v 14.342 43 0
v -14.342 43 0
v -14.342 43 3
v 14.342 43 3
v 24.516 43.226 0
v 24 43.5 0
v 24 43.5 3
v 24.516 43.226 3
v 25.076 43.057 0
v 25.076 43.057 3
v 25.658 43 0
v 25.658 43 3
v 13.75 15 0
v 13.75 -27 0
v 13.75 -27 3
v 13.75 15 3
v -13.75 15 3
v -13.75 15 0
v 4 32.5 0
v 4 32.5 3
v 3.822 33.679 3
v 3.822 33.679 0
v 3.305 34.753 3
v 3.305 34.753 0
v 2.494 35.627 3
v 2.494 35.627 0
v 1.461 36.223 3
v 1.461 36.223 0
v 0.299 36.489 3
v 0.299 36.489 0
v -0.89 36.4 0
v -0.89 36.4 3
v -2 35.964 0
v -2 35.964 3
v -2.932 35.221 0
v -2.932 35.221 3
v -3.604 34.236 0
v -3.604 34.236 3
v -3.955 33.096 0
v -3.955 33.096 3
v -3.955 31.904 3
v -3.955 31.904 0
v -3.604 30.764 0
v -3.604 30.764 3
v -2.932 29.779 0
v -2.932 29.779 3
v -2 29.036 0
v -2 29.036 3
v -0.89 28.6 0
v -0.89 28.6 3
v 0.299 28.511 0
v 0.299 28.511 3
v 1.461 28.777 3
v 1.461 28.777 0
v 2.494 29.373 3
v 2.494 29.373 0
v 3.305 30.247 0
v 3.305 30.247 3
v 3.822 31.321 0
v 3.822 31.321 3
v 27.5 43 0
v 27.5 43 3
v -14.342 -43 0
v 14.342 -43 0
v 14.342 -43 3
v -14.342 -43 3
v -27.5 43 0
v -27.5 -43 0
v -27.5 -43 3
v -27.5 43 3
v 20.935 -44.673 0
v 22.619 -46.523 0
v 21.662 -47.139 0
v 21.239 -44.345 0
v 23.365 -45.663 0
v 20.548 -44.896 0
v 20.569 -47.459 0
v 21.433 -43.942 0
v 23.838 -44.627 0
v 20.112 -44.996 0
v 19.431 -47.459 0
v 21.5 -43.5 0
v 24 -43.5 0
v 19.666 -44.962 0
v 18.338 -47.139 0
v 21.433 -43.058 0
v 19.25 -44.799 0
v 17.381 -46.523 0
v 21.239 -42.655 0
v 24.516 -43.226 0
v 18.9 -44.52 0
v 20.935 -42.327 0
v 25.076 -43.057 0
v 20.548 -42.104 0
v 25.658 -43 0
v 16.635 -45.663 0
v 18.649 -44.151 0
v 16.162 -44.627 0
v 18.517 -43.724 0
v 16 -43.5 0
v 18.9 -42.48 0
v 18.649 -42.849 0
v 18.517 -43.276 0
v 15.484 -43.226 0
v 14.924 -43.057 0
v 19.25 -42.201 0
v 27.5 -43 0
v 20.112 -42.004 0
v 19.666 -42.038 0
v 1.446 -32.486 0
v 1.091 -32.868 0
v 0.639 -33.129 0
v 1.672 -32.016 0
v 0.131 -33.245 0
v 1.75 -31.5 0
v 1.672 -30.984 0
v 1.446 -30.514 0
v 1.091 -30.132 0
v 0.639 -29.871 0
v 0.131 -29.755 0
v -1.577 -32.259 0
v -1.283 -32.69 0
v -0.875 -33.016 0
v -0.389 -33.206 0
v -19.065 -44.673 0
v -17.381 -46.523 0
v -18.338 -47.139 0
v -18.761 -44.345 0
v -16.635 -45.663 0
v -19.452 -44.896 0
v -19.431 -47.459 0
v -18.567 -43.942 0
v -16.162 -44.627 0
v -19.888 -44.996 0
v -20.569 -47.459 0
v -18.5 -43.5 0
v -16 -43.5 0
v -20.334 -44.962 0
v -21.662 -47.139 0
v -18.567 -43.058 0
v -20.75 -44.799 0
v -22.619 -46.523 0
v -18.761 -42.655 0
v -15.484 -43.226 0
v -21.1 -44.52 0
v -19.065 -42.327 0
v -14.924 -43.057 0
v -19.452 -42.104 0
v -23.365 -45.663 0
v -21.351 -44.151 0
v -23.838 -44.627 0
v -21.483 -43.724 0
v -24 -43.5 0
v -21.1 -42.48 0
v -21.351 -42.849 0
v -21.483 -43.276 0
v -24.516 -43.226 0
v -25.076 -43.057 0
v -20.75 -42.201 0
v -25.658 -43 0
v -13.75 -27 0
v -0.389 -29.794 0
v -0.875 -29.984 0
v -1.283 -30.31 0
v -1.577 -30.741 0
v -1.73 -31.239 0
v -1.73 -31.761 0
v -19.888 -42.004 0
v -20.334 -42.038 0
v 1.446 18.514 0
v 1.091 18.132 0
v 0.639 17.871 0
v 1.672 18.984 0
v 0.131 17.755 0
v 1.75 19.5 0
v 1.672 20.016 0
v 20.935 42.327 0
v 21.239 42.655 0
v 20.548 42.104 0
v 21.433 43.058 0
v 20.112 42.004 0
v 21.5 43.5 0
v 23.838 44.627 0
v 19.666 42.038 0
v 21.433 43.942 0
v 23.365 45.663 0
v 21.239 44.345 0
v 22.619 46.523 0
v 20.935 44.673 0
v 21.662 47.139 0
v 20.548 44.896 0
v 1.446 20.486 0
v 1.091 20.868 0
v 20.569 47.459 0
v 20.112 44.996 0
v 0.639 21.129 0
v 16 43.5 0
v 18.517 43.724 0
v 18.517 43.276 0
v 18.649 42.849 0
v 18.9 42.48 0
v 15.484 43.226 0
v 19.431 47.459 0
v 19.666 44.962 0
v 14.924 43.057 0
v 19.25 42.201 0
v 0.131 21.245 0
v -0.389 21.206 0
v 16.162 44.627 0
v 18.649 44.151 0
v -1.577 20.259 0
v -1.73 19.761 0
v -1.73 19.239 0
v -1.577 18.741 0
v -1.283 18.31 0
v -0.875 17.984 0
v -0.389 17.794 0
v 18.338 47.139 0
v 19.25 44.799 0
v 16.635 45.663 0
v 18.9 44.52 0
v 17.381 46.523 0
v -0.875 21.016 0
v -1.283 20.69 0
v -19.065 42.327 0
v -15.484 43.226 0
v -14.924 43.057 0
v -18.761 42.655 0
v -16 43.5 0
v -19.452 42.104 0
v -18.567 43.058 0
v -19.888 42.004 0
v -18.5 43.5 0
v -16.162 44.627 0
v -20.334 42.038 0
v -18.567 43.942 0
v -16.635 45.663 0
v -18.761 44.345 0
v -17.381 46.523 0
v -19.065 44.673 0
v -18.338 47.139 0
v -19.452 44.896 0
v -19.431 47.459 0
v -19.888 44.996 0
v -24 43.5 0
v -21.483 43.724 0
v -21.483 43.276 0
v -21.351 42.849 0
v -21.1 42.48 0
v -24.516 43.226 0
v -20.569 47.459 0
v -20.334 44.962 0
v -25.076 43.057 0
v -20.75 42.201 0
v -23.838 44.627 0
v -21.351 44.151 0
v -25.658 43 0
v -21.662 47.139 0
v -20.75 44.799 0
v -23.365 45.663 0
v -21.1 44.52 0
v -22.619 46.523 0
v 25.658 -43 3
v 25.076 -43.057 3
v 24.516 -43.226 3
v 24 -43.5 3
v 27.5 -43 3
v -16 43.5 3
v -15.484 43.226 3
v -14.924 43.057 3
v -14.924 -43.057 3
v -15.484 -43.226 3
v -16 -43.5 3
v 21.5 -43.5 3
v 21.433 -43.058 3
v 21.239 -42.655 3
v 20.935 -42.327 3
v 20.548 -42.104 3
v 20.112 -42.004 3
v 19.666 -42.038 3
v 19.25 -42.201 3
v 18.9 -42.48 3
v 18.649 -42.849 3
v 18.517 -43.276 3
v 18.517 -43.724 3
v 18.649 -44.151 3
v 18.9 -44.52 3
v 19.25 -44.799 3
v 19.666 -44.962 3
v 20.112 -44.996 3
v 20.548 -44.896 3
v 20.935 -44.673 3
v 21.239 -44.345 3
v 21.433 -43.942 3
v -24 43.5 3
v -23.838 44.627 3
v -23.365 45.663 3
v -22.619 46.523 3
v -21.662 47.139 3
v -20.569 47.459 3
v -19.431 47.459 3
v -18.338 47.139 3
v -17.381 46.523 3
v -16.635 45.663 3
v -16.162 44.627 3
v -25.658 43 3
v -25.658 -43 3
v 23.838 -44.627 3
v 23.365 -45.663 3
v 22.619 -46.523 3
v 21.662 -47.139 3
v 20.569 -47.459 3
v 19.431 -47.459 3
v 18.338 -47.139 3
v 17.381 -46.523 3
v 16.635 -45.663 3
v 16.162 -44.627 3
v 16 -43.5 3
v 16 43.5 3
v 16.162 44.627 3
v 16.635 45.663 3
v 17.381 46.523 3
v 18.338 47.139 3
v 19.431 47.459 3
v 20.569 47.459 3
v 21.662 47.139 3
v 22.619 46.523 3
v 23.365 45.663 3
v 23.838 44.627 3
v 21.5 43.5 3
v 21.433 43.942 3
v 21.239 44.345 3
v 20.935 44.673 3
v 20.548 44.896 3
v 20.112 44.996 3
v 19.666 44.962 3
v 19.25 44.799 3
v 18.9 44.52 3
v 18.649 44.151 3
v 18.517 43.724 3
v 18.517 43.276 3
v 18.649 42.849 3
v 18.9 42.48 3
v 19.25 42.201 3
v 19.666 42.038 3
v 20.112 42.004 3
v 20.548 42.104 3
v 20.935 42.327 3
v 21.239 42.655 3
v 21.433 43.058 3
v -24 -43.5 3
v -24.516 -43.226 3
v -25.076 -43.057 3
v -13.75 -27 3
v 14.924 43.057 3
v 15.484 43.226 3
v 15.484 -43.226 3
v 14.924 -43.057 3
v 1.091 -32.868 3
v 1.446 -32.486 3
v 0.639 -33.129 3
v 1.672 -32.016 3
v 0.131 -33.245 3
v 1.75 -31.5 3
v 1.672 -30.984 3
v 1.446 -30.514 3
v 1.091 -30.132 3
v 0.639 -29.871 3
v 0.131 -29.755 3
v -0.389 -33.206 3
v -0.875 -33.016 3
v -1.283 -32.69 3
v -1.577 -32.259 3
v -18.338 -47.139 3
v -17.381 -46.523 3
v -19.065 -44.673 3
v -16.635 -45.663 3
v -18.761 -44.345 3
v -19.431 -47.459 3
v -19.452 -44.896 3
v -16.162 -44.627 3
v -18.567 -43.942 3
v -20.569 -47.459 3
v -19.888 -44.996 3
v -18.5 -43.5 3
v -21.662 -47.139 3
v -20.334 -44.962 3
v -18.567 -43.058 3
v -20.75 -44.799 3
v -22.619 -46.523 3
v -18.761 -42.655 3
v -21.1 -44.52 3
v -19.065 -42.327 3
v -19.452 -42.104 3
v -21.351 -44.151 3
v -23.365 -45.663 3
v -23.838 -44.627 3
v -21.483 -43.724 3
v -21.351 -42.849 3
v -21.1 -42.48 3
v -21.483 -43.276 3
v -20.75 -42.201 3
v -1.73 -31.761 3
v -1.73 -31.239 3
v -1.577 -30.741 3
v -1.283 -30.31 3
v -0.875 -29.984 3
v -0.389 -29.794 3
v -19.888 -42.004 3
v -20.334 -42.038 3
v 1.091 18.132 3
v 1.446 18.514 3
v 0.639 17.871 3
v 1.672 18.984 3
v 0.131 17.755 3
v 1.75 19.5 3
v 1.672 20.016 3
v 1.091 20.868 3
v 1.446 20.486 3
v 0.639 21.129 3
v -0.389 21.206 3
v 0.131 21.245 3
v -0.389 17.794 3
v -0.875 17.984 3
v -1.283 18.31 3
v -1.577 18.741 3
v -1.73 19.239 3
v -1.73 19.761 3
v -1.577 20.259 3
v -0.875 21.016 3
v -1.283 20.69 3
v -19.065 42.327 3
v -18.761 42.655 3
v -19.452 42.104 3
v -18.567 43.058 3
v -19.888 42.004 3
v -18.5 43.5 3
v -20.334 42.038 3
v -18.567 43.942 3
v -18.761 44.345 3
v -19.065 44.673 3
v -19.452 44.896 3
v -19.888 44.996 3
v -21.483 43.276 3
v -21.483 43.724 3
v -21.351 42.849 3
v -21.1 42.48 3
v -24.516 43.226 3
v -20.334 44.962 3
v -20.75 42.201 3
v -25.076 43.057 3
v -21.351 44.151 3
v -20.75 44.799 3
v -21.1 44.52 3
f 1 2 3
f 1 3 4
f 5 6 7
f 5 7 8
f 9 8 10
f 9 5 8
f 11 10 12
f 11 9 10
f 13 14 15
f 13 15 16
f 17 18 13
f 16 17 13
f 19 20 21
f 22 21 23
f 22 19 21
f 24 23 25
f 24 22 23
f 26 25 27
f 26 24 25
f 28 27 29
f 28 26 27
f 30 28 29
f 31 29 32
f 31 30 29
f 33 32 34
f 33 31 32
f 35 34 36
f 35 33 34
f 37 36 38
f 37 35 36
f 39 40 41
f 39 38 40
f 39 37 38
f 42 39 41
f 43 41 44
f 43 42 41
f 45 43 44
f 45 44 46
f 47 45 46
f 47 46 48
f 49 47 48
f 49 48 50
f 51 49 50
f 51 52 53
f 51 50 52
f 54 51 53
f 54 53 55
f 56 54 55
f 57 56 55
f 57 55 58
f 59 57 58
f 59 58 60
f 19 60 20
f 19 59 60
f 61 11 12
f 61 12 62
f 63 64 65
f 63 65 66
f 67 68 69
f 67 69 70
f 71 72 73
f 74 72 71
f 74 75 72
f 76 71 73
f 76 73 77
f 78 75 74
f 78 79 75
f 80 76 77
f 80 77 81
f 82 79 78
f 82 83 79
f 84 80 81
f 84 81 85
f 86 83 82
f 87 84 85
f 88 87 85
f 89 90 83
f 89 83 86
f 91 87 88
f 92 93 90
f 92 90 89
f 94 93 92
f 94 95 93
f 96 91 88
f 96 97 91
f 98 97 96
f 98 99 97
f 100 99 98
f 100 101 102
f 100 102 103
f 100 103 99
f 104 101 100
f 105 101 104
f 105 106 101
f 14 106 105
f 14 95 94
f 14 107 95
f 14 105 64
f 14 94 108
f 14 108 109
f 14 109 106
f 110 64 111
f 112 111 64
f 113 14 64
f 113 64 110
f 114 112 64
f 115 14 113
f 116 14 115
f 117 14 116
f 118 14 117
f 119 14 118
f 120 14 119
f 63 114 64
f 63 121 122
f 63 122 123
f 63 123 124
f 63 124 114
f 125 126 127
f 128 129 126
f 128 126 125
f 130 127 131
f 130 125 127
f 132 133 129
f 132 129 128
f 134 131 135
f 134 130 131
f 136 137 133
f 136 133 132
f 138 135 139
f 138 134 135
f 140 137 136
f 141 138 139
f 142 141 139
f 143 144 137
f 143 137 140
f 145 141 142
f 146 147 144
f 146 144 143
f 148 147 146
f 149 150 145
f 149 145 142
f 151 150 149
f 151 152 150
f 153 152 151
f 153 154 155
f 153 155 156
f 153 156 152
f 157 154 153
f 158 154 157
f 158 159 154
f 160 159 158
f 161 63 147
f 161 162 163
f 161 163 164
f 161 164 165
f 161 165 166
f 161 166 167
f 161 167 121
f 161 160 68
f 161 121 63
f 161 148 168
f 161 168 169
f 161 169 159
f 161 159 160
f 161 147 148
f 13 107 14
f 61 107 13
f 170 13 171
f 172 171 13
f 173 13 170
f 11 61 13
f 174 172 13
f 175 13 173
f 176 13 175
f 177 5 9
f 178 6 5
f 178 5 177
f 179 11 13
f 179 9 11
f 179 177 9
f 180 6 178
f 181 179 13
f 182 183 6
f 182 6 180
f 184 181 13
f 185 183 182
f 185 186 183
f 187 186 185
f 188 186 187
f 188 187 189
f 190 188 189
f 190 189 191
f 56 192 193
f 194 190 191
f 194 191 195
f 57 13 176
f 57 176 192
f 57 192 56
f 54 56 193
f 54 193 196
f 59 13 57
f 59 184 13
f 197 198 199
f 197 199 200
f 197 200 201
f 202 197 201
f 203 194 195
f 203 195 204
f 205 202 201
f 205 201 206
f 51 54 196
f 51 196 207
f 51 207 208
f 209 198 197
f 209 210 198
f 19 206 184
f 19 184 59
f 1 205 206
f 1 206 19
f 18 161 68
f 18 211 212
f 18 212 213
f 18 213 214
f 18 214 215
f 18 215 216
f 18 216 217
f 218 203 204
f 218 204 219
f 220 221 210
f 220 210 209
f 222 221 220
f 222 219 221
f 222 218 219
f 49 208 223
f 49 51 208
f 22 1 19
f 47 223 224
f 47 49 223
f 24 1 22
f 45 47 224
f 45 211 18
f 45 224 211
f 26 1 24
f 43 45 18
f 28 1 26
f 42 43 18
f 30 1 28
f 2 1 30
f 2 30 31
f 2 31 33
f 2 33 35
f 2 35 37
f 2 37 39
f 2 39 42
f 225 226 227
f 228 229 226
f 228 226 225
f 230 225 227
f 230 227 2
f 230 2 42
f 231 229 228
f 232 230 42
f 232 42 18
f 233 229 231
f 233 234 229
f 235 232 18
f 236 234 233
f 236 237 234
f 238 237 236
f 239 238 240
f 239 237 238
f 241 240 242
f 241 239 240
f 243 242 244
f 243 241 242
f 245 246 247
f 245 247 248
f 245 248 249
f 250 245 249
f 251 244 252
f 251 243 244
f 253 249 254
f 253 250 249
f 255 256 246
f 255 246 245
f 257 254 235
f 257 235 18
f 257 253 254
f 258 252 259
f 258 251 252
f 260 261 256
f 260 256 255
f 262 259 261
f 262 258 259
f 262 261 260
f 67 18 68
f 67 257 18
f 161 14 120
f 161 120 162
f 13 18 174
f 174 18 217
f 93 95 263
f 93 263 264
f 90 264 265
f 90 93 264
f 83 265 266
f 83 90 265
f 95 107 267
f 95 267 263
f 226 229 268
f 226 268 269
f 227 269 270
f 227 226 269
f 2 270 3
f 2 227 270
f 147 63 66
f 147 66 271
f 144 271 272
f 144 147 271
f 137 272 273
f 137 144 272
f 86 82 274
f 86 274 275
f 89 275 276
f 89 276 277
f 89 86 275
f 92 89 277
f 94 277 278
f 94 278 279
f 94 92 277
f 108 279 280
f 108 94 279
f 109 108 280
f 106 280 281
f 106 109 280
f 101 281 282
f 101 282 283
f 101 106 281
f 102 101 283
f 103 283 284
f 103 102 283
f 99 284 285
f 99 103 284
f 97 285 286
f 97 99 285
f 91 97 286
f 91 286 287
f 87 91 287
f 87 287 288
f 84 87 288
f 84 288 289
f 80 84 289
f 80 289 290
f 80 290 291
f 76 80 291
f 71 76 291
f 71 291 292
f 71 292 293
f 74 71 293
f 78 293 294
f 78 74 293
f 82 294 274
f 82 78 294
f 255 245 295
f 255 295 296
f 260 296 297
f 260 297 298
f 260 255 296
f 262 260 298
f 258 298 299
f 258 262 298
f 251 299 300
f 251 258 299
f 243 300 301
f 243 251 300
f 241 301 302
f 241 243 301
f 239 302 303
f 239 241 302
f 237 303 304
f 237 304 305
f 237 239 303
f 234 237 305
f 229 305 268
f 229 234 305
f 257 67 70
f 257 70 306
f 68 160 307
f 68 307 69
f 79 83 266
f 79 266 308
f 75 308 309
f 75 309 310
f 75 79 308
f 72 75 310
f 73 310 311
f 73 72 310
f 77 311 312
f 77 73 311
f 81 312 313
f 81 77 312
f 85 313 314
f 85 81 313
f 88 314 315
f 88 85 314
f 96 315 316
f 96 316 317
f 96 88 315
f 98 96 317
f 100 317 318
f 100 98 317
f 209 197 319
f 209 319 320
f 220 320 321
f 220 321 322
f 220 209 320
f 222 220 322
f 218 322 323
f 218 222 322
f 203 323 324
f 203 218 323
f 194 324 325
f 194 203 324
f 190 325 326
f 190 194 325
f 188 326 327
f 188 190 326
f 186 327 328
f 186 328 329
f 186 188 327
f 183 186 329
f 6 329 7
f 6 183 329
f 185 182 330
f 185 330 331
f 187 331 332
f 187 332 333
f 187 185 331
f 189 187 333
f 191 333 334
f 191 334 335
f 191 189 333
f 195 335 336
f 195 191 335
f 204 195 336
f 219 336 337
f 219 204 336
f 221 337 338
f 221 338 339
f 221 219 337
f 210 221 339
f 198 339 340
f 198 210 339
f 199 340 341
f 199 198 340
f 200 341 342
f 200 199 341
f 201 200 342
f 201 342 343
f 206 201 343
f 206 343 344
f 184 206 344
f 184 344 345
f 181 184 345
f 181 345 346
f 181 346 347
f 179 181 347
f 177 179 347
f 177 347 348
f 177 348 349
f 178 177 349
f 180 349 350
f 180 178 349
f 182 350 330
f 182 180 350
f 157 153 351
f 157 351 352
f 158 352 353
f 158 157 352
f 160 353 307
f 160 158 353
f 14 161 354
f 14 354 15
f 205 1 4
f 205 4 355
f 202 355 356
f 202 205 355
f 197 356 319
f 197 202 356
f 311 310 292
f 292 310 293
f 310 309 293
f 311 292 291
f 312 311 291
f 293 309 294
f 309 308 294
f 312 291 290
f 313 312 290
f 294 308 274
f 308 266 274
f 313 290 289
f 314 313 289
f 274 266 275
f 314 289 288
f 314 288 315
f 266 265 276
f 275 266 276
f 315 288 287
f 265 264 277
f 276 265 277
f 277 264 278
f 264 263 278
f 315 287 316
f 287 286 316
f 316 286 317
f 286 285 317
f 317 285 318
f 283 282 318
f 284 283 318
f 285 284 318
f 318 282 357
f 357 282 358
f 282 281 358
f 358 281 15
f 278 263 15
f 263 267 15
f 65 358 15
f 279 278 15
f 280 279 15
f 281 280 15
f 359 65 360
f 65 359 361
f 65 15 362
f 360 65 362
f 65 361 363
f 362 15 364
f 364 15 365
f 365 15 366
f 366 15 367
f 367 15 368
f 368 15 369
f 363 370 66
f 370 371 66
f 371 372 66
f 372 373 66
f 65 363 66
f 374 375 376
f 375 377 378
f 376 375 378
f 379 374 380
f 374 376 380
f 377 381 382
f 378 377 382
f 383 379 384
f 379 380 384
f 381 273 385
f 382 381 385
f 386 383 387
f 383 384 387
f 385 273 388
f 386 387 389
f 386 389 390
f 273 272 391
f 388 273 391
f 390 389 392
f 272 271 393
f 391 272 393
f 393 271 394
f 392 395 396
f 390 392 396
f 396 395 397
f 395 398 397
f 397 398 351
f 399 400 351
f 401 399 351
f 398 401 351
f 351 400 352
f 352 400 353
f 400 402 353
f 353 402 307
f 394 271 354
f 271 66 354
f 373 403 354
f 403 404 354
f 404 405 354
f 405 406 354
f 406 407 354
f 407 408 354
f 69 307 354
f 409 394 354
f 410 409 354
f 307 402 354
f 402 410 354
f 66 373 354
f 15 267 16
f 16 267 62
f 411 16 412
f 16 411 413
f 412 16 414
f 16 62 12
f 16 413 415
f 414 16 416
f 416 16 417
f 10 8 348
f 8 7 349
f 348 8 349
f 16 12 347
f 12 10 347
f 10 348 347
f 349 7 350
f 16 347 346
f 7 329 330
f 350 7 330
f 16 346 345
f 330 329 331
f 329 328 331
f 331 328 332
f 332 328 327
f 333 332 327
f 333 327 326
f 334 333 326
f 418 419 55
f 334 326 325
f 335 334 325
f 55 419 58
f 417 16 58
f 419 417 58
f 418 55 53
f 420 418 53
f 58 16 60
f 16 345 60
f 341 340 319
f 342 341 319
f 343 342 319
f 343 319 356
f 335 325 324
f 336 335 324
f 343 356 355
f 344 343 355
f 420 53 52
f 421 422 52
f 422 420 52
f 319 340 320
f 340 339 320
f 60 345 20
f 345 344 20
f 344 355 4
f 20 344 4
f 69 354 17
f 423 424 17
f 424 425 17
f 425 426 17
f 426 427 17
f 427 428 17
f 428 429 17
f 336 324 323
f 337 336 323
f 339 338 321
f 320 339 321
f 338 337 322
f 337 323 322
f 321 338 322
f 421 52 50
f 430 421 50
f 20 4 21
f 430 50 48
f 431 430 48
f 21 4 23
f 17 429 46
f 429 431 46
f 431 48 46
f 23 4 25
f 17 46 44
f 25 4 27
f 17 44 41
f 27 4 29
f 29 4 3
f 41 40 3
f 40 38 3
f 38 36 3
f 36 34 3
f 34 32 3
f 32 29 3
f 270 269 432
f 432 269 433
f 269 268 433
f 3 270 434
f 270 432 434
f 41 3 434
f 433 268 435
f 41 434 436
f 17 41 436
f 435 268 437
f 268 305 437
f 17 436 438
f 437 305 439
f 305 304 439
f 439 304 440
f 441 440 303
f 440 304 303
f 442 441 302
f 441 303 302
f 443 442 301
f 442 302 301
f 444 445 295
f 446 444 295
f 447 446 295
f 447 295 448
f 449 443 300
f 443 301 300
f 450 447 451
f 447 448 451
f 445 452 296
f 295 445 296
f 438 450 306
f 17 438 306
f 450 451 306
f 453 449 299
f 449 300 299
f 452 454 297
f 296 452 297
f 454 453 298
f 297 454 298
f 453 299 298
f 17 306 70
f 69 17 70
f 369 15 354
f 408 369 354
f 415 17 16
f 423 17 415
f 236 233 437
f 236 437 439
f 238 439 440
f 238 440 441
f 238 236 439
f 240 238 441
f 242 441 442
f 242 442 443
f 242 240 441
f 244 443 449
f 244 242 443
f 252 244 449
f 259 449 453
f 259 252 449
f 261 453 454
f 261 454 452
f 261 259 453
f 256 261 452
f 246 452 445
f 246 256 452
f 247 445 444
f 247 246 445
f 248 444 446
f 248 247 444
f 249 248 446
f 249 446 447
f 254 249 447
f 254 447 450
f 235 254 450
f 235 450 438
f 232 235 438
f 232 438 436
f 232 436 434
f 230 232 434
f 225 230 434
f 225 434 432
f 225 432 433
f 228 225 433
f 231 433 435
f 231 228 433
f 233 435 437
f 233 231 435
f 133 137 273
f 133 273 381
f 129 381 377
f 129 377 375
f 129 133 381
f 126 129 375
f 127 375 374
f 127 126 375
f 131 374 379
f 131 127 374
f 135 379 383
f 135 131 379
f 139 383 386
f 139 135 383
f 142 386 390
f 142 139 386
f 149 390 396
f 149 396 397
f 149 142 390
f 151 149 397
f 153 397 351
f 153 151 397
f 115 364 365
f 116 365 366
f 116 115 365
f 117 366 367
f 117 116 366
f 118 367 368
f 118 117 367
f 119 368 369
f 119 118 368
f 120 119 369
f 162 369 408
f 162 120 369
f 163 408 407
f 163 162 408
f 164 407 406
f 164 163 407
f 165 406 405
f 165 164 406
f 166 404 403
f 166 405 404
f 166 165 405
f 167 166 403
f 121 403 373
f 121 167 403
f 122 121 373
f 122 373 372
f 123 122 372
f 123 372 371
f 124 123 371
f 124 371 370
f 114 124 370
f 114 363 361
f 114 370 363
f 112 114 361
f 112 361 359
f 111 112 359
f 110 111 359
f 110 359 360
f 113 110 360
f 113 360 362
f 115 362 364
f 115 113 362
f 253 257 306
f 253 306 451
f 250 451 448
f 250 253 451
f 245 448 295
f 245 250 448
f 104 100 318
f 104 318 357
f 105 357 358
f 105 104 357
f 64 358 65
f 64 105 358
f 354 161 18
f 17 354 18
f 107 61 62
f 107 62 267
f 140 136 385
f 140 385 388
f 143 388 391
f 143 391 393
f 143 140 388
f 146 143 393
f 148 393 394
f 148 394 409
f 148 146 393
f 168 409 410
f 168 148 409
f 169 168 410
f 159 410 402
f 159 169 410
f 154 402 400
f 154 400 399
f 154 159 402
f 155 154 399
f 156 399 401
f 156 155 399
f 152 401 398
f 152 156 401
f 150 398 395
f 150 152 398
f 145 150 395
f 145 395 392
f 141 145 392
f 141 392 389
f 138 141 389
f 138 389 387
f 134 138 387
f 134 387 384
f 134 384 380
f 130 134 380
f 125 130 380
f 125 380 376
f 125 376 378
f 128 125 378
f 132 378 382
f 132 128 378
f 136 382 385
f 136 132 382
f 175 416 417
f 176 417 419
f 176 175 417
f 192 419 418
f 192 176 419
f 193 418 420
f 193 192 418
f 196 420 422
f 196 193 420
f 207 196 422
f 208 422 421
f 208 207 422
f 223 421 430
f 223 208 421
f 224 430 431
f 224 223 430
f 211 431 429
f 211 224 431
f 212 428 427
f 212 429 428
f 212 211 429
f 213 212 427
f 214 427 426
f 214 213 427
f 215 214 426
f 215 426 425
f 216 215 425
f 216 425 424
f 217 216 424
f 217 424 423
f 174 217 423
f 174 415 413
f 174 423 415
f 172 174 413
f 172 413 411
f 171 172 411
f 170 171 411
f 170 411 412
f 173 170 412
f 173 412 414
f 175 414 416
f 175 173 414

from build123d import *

# Parameters (mm, degrees)
SKETCH1_R           = 1.5
BOSS_EXTRUDE1_DEPTH = 3
SKETCH2_R           = 4
SKETCH2_R_2         = 1.75
SKETCH2_W           = 27.5
SKETCH2_H           = 42
CUT_EXTRUDE1_DEPTH  = 55.968172609


with BuildPart() as part:
    # Sketch1 → Boss-Extrude1 (new body)
    with BuildSketch(Plane.XY):
        with BuildLine():
            ThreePointArc((-14.341687605, -43), (-15.207713009, -43.127718677), (-16, -43.5))
            ThreePointArc((-16, -43.5), (-20, -47.5), (-24, -43.5))
            ThreePointArc((-24, -43.5), (-24.792286991, -43.127718677), (-25.658312395, -43))
            Line((-25.658312395, -43), (-27.5, -43))
            Line((-27.5, -43), (-27.5, 43))
            Line((-27.5, 43), (-25.658312395, 43))
            ThreePointArc((-25.658312395, 43), (-24.792286991, 43.127718677), (-24, 43.5))
            ThreePointArc((-24, 43.5), (-20, 47.5), (-16, 43.5))
            ThreePointArc((-16, 43.5), (-15.207713009, 43.127718677), (-14.341687605, 43))
            Line((-14.341687605, 43), (-10.658312395, 43))
            Line((-10.658312395, 43), (10.658312395, 43))
            Line((10.658312395, 43), (14.341687605, 43))
            ThreePointArc((14.341687605, 43), (15.207713009, 43.127718677), (16, 43.5))
            ThreePointArc((16, 43.5), (20, 47.5), (24, 43.5))
            ThreePointArc((24, 43.5), (24.792286991, 43.127718677), (25.658312395, 43))
            Line((25.658312395, 43), (27.5, 43))
            Line((27.5, 43), (27.5, -43))
            Line((27.5, -43), (25.658312395, -43))
            ThreePointArc((25.658312395, -43), (24.792286991, -43.127718677), (24, -43.5))
            ThreePointArc((24, -43.5), (20, -47.5), (16, -43.5))
            ThreePointArc((16, -43.5), (15.207713009, -43.127718677), (14.341687605, -43))
            Line((14.341687605, -43), (10.658312395, -43))
            Line((10.658312395, -43), (-10.658312395, -43))
            Line((-10.658312395, -43), (-14.341687605, -43))
        make_face()
        with Locations((20, -43.5)):
            Circle(SKETCH1_R, mode=Mode.SUBTRACT)
        with Locations((-20, -43.5)):
            Circle(SKETCH1_R, mode=Mode.SUBTRACT)
        with Locations((20, 43.5)):
            Circle(SKETCH1_R, mode=Mode.SUBTRACT)
        with Locations((-20, 43.5)):
            Circle(SKETCH1_R, mode=Mode.SUBTRACT)
    extrude(amount=BOSS_EXTRUDE1_DEPTH)

    # Sketch2 → Cut-Extrude1 (cut, through all)
    with BuildSketch(Plane.XY):
        with Locations((0, 32.5)):
            Circle(SKETCH2_R)
        with Locations((0, 19.5)):
            Circle(SKETCH2_R_2)
        with Locations((0, -31.5)):
            Circle(SKETCH2_R_2)
        with Locations((0, -6)):
            Rectangle(SKETCH2_W, SKETCH2_H)
    extrude(amount=CUT_EXTRUDE1_DEPTH, mode=Mode.SUBTRACT)


solid = part.part
